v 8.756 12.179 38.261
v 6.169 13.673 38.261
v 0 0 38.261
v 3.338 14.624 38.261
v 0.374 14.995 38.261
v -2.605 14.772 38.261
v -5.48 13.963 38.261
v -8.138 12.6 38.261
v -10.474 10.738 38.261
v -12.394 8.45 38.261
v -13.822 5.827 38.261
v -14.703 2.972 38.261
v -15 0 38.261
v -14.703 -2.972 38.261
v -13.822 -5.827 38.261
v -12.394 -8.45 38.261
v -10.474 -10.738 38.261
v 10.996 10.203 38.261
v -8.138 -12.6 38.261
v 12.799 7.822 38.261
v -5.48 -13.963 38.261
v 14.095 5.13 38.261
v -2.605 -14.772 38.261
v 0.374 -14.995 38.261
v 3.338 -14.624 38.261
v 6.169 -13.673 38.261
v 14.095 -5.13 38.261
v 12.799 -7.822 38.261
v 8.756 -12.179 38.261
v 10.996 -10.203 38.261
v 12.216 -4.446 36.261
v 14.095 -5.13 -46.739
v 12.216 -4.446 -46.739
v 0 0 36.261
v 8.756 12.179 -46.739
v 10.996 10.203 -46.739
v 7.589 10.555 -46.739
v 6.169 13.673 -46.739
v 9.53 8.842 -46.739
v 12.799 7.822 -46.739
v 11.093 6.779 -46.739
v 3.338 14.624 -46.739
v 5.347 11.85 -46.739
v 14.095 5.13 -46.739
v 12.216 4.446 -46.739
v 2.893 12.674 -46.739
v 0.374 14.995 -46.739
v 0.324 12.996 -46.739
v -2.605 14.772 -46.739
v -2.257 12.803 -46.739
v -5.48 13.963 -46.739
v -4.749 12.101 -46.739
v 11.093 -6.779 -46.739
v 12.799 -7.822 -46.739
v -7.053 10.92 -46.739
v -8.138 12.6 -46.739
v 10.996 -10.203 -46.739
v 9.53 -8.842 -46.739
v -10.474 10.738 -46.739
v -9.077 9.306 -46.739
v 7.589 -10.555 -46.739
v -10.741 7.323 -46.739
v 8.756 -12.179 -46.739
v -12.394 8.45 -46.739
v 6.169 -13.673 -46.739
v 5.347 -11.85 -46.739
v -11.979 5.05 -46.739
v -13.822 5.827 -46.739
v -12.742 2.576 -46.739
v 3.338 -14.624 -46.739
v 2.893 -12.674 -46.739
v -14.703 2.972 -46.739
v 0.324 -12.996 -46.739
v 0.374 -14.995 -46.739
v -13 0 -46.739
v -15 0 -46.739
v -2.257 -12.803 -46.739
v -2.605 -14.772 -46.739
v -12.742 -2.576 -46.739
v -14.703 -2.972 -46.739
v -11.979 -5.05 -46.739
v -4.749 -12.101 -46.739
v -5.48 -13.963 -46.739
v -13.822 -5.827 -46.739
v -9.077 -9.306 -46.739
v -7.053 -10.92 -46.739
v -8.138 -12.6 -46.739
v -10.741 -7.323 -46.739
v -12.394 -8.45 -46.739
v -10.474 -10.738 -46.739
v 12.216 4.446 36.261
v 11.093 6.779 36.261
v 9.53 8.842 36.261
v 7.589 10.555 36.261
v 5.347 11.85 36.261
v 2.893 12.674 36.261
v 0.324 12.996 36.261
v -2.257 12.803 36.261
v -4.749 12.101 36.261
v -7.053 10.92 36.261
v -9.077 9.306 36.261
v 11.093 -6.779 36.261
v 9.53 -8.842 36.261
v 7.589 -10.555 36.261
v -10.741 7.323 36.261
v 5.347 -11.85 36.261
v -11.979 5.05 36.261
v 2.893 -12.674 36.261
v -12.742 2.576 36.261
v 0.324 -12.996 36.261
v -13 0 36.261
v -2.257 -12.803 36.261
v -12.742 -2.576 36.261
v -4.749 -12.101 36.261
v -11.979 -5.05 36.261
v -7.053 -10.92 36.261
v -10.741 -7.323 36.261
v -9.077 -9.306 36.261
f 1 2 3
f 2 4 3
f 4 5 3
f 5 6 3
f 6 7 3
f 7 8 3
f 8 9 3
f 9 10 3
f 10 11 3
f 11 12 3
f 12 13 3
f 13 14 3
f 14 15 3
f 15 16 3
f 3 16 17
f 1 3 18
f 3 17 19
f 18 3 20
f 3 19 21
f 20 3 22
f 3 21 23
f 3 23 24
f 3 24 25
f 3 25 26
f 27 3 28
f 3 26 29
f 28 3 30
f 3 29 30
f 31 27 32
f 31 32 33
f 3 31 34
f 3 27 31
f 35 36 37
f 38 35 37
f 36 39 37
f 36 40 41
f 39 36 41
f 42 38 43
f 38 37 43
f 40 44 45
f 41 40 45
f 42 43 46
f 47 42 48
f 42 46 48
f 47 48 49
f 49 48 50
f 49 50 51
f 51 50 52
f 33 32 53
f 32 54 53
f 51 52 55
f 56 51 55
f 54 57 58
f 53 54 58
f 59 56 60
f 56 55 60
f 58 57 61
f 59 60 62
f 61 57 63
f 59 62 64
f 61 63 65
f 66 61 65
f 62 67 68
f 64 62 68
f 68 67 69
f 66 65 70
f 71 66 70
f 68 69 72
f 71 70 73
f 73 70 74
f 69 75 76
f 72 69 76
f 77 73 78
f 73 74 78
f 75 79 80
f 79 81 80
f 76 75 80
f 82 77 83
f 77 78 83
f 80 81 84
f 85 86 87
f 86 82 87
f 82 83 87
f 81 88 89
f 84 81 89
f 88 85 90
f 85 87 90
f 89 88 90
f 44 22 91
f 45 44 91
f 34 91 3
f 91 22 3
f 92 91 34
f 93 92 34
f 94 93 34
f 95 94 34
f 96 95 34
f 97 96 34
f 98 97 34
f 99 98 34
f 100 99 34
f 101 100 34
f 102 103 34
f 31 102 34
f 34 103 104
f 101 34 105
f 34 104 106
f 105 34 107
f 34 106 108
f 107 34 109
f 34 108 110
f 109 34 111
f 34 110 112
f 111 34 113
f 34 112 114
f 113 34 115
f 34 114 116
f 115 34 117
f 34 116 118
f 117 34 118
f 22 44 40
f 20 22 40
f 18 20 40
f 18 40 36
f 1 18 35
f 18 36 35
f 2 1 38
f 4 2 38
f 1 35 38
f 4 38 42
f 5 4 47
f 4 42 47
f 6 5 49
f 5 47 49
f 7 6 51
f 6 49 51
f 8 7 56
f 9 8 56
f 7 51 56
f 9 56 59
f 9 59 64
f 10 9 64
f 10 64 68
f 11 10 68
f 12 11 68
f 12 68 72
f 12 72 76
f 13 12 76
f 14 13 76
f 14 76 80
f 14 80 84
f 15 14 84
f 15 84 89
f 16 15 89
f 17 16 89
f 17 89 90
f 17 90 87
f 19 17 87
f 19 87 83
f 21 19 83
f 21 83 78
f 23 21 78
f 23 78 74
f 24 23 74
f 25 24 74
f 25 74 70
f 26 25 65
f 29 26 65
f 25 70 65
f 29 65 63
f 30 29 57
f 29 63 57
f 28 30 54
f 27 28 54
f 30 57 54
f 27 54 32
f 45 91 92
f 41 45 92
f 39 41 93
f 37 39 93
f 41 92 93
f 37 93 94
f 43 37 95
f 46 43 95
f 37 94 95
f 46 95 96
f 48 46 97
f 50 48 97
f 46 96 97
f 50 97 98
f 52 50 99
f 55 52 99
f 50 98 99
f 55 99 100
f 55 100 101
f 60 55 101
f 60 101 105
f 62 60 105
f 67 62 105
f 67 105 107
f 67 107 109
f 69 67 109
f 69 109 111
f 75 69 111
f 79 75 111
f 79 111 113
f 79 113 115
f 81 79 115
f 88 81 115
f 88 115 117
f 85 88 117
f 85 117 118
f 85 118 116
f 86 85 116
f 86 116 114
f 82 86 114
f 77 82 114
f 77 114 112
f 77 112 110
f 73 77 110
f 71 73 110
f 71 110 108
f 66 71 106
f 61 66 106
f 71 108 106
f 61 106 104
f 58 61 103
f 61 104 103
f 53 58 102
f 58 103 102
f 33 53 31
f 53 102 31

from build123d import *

# Parameters (mm, degrees)
F2_ANGLE = 320


with BuildPart() as f2:
    # F0 (on Front) → F2 (revolve, symmetric)
    with BuildSketch(Plane.XZ) as f2_sk:
        Polygon((0, 36.260698), (0, 38.260698), (-15, 38.260698), (-15, -46.739302), (-13, -46.739302), (-13, 36.260698), align=None)
    revolve(axis=Axis((0, 0, -8.945528), (0, 0, -1)), revolution_arc=F2_ANGLE / 2)
    revolve(f2_sk.sketch, axis=Axis((0, 0, -8.945528), (0, 0, 1)), revolution_arc=F2_ANGLE / 2)


solid = f2.part
